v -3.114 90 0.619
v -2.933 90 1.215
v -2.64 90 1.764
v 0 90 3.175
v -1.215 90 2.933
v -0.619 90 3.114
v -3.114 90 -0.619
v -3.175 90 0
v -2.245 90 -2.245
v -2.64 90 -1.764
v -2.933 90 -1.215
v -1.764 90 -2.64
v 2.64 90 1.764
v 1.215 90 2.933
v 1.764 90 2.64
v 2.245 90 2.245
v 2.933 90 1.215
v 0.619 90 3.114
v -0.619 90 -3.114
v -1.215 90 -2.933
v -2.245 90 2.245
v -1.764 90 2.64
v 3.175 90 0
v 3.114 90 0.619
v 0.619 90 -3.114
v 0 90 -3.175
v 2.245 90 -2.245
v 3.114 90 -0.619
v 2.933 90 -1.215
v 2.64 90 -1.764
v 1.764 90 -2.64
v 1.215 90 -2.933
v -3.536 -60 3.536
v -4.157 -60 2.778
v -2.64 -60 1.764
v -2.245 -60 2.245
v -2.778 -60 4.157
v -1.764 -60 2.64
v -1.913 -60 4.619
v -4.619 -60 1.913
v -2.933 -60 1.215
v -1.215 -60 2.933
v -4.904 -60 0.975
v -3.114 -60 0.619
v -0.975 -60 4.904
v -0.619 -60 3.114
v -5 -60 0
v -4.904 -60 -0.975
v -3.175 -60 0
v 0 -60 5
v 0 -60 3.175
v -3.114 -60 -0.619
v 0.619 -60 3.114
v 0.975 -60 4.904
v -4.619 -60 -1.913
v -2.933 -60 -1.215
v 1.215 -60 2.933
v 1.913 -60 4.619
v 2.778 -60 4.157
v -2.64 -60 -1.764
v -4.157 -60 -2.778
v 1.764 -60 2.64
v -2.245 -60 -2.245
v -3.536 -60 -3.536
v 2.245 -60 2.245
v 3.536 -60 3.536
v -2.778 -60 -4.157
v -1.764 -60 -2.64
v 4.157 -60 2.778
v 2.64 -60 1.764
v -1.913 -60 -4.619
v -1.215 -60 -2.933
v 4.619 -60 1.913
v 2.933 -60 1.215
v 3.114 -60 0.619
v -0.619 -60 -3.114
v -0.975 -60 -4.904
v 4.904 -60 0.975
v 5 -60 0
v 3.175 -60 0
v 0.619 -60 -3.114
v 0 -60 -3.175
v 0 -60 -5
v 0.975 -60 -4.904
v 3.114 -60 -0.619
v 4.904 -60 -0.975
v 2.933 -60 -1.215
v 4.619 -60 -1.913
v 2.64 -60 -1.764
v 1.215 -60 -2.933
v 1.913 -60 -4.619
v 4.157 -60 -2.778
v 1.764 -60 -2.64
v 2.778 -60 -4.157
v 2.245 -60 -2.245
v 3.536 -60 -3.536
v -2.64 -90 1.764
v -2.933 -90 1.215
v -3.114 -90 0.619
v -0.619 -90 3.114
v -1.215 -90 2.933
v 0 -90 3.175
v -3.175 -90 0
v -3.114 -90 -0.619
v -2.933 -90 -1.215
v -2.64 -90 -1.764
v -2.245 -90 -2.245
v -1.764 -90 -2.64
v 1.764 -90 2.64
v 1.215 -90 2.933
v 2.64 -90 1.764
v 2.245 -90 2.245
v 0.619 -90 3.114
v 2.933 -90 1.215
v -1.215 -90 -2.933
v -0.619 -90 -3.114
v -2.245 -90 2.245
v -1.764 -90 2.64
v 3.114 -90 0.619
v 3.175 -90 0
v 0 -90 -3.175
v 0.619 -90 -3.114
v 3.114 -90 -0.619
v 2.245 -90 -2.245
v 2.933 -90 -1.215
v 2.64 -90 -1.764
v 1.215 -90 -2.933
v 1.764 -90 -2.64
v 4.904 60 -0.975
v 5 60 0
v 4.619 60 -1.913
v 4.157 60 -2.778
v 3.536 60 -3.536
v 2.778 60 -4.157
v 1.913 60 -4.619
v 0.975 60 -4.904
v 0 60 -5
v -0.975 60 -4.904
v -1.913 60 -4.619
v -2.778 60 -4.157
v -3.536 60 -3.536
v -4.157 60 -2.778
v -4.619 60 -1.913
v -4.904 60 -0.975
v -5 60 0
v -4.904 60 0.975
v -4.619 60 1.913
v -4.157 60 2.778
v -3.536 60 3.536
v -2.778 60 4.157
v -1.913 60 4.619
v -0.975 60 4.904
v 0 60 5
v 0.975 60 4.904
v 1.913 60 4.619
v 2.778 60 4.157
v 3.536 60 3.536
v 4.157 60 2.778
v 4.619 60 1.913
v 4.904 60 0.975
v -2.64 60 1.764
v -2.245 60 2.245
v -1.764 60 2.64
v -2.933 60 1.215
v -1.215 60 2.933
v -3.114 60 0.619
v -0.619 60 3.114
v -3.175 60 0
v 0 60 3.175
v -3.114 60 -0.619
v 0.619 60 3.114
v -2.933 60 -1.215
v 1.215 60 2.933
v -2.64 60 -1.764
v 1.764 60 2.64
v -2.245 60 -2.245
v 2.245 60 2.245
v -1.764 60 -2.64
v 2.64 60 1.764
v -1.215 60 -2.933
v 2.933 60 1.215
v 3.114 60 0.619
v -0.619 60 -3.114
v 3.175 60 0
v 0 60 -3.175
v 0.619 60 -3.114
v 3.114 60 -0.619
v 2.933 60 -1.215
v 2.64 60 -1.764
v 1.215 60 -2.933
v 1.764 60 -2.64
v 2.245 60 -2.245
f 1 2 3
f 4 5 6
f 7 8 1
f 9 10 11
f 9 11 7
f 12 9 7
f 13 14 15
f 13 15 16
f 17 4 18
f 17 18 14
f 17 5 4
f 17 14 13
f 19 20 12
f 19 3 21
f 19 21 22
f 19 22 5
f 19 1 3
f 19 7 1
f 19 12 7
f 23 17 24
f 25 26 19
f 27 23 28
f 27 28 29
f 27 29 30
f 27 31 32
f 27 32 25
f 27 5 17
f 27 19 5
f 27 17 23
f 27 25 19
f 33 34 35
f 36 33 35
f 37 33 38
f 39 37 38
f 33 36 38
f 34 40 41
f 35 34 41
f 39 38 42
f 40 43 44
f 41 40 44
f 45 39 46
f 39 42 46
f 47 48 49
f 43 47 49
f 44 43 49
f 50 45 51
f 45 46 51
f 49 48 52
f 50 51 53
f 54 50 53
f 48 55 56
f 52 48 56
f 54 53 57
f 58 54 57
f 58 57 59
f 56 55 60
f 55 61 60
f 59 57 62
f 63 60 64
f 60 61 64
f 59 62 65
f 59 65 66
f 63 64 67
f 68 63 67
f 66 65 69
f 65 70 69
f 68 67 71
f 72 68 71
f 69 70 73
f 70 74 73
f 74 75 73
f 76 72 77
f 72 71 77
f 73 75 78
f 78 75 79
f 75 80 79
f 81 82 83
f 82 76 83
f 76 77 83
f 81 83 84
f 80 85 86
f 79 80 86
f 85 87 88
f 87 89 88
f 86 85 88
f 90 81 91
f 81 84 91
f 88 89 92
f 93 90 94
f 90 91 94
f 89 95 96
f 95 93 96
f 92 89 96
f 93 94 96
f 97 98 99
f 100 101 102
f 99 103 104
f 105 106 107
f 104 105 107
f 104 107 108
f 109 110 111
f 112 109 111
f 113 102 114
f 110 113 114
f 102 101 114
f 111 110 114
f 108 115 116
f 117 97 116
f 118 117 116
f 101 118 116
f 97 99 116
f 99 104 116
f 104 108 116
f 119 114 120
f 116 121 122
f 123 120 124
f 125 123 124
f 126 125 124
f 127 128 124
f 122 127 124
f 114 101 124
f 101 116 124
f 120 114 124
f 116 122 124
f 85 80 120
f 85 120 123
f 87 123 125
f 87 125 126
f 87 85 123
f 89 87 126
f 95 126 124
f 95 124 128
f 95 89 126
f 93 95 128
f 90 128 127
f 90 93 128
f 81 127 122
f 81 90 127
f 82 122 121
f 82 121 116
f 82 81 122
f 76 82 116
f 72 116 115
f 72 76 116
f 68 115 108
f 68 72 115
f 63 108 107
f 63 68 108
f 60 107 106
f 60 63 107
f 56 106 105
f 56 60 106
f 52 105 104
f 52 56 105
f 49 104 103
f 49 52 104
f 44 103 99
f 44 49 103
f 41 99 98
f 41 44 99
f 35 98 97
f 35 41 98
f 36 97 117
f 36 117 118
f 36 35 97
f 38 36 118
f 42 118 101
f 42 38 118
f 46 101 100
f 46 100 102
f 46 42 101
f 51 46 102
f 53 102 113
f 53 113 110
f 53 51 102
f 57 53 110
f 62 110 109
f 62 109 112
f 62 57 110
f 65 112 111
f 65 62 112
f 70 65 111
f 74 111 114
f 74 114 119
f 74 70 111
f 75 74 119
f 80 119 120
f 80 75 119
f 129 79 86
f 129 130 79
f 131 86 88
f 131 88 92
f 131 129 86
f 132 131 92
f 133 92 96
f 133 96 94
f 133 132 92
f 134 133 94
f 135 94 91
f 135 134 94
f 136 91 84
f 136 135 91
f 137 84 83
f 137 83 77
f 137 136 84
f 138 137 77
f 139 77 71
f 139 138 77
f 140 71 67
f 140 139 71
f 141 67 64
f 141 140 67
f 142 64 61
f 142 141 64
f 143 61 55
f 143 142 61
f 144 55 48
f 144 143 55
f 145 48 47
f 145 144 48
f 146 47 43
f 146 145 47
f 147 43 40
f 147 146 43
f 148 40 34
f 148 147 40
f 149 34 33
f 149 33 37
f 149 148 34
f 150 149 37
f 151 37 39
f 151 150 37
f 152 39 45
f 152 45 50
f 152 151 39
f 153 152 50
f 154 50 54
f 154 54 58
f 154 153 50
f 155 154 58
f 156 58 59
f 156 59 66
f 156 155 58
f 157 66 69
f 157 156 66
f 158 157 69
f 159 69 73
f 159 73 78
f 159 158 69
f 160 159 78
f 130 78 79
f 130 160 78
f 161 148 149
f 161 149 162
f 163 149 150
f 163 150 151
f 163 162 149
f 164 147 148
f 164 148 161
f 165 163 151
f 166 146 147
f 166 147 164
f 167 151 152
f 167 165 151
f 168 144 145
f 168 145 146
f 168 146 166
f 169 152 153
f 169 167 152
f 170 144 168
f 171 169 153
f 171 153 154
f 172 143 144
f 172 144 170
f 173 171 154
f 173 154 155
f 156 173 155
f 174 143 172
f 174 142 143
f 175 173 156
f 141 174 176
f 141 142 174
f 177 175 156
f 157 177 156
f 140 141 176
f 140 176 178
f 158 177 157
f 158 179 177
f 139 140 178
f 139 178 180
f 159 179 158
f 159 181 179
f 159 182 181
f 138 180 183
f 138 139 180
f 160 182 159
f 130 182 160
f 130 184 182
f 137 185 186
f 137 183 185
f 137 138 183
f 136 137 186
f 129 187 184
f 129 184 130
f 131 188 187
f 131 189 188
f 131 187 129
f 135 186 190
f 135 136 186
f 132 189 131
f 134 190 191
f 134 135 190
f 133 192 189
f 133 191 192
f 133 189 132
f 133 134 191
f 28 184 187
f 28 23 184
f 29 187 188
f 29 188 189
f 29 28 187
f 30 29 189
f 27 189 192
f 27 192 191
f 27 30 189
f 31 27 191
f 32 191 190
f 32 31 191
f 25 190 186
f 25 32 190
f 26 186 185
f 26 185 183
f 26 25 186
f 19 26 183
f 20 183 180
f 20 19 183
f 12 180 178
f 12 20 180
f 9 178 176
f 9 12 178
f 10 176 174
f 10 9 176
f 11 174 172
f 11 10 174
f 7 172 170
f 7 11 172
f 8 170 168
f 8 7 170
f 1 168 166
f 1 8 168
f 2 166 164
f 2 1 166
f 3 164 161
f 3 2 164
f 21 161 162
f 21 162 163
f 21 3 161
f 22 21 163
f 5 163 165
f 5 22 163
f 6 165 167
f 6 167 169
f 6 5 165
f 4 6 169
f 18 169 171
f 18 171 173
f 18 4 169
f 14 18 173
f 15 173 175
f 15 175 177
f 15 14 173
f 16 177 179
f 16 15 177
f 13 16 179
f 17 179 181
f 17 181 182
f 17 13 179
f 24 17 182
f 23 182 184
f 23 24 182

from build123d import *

# Parameters (mm, degrees)
SKETCH1_R           = 3.175
BOSS_EXTRUDE2_DEPTH = 90
SKETCH1_4_R         = 5
SKETCH1_4_R_2       = 3.175
BOSS_EXTRUDE3_DEPTH = 60


with BuildPart() as part:
    # Sketch1 → Boss-Extrude2 (new, symmetric)
    with BuildSketch(Plane(origin=(0, 0, 0), x_dir=(1, 0, 0), z_dir=(0, 1, 0))):
        Circle(SKETCH1_R)
    extrude(amount=BOSS_EXTRUDE2_DEPTH, both=True)

    # Sketch1<4> → Boss-Extrude3 (add, symmetric)
    with BuildSketch(Plane(origin=(0, 0, 0), x_dir=(1, 0, 0), z_dir=(0, 1, 0))):
        Circle(SKETCH1_4_R)
        Circle(SKETCH1_4_R_2, mode=Mode.SUBTRACT)
    extrude(amount=BOSS_EXTRUDE3_DEPTH, both=True)


solid = part.part
